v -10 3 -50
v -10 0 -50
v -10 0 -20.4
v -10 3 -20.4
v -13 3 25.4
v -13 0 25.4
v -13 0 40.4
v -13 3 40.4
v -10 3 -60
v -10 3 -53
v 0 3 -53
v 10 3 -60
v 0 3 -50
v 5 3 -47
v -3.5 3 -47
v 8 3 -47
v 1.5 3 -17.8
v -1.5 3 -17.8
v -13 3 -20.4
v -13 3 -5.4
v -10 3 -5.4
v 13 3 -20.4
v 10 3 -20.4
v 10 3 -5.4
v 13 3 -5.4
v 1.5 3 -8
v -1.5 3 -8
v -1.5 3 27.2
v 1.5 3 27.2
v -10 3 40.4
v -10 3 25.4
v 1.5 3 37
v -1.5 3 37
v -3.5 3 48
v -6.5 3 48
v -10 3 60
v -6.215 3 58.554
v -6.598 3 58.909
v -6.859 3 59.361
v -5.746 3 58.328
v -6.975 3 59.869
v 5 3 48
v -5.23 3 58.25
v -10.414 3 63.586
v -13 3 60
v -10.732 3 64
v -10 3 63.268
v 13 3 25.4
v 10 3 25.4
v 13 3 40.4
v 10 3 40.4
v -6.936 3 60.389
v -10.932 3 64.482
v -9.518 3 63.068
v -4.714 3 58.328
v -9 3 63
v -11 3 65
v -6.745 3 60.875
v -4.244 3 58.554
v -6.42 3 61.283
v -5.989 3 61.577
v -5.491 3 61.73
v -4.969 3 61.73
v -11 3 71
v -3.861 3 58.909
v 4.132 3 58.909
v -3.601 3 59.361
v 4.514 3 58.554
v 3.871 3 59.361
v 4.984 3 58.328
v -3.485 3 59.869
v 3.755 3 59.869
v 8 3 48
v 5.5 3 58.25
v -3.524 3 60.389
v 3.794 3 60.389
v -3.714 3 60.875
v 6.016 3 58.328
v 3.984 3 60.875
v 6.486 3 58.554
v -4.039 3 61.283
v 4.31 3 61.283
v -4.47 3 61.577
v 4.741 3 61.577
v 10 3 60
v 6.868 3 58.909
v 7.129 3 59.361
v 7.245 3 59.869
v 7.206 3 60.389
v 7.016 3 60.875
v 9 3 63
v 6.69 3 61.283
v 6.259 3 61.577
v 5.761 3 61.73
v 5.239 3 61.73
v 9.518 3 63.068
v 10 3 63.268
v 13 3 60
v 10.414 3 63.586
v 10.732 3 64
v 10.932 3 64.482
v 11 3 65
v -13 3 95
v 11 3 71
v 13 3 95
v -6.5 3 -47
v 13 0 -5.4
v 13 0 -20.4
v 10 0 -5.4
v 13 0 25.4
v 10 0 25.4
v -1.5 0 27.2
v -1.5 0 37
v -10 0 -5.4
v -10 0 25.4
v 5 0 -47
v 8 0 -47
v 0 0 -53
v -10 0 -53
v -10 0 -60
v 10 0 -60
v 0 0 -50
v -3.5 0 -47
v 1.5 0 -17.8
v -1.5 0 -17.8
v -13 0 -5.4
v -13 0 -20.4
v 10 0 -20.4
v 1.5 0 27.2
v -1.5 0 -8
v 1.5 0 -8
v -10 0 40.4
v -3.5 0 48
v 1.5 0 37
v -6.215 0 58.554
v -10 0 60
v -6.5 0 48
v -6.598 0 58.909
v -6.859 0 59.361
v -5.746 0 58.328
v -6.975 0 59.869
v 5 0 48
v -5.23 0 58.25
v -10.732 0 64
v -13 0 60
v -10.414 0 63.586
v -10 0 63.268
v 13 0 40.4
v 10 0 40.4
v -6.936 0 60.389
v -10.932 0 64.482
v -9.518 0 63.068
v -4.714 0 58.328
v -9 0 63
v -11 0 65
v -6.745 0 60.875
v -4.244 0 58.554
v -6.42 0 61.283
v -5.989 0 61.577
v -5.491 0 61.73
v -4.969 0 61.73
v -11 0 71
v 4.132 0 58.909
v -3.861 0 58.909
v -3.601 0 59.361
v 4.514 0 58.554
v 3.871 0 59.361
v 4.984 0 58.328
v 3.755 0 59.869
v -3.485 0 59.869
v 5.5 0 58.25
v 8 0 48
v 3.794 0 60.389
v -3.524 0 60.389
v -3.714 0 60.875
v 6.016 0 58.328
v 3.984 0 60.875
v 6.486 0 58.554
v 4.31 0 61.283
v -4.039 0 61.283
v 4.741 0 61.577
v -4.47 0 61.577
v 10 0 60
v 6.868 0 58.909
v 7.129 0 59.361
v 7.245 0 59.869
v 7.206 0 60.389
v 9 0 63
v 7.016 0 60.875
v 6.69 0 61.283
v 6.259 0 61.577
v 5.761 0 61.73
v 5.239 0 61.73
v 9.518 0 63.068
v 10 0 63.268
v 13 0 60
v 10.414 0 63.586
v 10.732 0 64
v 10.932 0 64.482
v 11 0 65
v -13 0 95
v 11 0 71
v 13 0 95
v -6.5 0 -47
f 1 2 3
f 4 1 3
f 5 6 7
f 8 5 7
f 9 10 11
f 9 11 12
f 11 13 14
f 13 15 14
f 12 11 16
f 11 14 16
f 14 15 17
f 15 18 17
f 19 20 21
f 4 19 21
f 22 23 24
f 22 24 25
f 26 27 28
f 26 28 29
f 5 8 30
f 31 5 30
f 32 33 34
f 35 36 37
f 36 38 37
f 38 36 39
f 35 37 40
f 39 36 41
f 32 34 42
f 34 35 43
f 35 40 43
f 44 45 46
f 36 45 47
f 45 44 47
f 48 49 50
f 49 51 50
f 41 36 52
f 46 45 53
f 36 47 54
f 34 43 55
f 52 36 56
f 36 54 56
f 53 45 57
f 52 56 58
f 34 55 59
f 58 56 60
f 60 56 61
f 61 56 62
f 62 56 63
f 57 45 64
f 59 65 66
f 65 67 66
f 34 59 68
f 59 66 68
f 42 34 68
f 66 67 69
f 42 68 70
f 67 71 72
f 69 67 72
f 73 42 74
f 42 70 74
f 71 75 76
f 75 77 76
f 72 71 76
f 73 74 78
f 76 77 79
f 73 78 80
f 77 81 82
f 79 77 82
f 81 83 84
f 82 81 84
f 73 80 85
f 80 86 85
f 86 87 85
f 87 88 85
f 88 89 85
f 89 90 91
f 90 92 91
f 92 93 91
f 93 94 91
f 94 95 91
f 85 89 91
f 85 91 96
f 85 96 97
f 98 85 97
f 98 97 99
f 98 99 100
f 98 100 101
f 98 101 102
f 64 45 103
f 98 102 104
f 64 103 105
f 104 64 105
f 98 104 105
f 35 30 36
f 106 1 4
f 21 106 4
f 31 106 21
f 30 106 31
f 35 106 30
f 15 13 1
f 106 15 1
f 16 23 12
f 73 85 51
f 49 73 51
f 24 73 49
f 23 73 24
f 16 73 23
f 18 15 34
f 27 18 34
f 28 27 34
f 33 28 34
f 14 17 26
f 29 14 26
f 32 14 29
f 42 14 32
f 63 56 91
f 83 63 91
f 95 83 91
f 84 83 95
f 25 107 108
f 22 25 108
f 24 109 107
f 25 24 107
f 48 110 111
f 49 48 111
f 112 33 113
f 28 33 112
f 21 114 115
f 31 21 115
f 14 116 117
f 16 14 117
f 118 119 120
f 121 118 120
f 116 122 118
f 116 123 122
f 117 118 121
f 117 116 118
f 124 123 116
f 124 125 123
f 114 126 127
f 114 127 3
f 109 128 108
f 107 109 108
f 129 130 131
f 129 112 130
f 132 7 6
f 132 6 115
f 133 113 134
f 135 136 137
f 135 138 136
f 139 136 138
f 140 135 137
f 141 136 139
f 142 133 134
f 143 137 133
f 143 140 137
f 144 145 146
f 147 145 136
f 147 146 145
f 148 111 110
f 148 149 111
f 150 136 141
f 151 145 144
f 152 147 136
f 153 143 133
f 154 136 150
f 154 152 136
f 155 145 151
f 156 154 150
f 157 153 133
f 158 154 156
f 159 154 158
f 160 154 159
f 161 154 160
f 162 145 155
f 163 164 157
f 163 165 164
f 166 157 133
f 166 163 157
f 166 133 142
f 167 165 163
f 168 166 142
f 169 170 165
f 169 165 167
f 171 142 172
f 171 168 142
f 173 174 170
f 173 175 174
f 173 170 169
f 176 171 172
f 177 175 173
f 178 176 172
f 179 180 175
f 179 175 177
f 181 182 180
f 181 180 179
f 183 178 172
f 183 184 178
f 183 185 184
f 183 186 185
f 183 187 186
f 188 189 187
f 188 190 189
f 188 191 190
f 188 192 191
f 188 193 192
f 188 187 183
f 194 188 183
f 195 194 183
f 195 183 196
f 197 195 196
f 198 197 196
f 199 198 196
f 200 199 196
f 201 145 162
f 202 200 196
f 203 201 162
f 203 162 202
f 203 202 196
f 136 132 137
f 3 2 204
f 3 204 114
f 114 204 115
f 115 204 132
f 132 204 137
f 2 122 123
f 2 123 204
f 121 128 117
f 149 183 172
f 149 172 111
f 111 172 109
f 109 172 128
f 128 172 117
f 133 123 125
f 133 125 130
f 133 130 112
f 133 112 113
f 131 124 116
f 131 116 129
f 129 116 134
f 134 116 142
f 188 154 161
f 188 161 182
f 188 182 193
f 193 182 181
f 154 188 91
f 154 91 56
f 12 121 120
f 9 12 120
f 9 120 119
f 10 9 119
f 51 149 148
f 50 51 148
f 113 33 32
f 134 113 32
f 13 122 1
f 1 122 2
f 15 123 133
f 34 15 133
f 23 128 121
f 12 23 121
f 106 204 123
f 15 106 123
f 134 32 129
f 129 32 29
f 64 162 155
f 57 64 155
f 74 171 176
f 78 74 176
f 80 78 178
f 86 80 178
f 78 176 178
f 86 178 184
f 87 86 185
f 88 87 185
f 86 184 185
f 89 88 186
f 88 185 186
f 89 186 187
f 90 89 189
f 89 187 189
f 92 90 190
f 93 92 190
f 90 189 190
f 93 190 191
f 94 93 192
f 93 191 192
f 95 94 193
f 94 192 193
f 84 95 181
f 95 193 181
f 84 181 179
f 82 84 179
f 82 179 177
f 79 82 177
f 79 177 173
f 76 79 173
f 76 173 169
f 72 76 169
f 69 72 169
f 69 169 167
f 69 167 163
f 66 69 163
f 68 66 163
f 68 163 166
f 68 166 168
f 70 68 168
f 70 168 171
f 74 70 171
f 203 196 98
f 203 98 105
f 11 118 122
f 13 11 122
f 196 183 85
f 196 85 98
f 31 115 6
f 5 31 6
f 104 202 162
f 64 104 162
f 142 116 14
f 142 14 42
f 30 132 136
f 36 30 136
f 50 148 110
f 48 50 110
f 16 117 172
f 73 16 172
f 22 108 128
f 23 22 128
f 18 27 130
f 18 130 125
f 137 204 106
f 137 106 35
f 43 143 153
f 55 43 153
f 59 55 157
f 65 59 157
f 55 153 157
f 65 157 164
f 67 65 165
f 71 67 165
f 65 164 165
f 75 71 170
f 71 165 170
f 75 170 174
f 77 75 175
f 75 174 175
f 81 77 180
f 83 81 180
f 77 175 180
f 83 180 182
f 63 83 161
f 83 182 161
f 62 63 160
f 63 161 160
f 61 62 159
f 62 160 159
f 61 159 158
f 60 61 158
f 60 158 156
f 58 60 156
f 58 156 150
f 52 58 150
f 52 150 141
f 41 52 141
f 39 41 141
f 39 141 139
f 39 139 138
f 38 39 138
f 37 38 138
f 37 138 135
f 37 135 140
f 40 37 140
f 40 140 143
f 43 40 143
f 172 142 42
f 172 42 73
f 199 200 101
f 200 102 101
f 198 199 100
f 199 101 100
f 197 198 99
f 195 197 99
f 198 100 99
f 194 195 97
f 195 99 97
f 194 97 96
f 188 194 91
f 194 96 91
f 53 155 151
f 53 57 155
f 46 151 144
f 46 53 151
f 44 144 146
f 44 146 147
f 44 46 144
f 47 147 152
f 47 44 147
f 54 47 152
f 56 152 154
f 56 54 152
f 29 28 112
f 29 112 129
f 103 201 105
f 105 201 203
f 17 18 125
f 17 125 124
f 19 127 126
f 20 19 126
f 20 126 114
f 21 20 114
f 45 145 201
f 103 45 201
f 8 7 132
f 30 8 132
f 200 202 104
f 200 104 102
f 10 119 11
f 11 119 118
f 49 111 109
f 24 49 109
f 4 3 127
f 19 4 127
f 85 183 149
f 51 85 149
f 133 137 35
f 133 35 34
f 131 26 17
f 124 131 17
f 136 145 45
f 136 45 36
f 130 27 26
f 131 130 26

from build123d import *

# Parameters (mm, degrees)
EXTRUDE_1_DEPTH     = 3
SKETCH_3_W          = 3
SKETCH_3_H          = 9.8
CUT_EXTRUDE_1_DEPTH = 10
SKETCH_4_W          = 26
SKETCH_4_H          = 35
EXTRUDE_2_DEPTH     = 3
SKETCH_5_W          = 22
SKETCH_5_H          = 8
CUT_EXTRUDE_2_DEPTH = 19
SKETCH_6_W          = 3
SKETCH_6_H          = 95
CUT_EXTRUDE_3_DEPTH = 25
FILLET_1_R          = 2
SKETCH_7_R          = 1.75
CUT_EXTRUDE_4_DEPTH = 10
SKETCH_8_R          = 1.75
SKETCH_8_W          = 3
SKETCH_8_H          = 95
CUT_EXTRUDE_5_DEPTH = 10


with BuildPart() as part:
    # Эскиз2 → Бобышка-Вытянуть1 (new body)
    with BuildSketch(Plane(origin=(0, 0, 0), x_dir=(1, 0, 0), z_dir=(0, 1, 0))):
        Polygon((-10, -60), (10, -60), (10, -40.4), (13, -40.4), (13, -25.4), (10, -25.4), (10, 5.4), (13, 5.4), (13, 20.4), (10, 20.4), (10, 60), (-10, 60), (-10, 53), (0, 53), (0, 50), (-10, 50), (-10, 20.4), (-13, 20.4), (-13, 5.4), (-10, 5.4), (-10, -25.4), (-13, -25.4), (-13, -40.4), (-10, -40.4), align=None)
    extrude(amount=EXTRUDE_1_DEPTH)

    # Эскиз3 → Вырез-Вытянуть1 (cut)
    with BuildSketch(Plane(origin=(0, 3, 0), x_dir=(1, 0, 0), z_dir=(0, 1, 0))):
        with Locations((0, 12.9)):
            Rectangle(SKETCH_3_W, SKETCH_3_H)
        with Locations((0, -32.1)):
            Rectangle(SKETCH_3_W, SKETCH_3_H)
    extrude(amount=-CUT_EXTRUDE_1_DEPTH, mode=Mode.SUBTRACT)

    # Эскиз4 → Бобышка-Вытянуть2 (add)
    with BuildSketch(Plane.XZ):
        with Locations((0, 77.5)):
            Rectangle(SKETCH_4_W, SKETCH_4_H)
    extrude(amount=-EXTRUDE_2_DEPTH)

    # Эскиз5 → Вырез-Вытянуть2 (cut)
    with BuildSketch(Plane(origin=(0, 0, 0), x_dir=(-1, 0, 0), z_dir=(0, -1, 0))):
        with Locations((0, -67)):
            Rectangle(SKETCH_5_W, SKETCH_5_H)
    extrude(amount=-CUT_EXTRUDE_2_DEPTH, mode=Mode.SUBTRACT)

    # Эскиз6 → Вырез-Вытянуть3 (cut)
    with BuildSketch(Plane.XZ):
        with Locations((6.5, 0.5)):
            Rectangle(SKETCH_6_W, SKETCH_6_H)
    extrude(amount=-CUT_EXTRUDE_3_DEPTH, mode=Mode.SUBTRACT)

    # Скругление1
    fillet_1_edges = [part.edges().sort_by_distance(p)[0] for p in [
        (-11, 1.5, 63),
        (11, 1.5, 63),
    ]]
    fillet(fillet_1_edges, radius=FILLET_1_R)

    # Эскиз7 → Вырез-Вытянуть4 (cut)
    with BuildSketch(Plane.XZ):
        with Locations(Location((5.5, 60, 0), (0, 0, 270))):
            Circle(SKETCH_7_R)
    extrude(amount=-CUT_EXTRUDE_4_DEPTH, mode=Mode.SUBTRACT)

    # Эскиз8 → Вырез-Вытянуть5 (cut)
    with BuildSketch(Plane.XZ):
        with Locations(Location((-5.229687219, 60, 0), (0, 0, 270))):
            Circle(SKETCH_8_R)
        with Locations((-5, 0.5)):
            Rectangle(SKETCH_8_W, SKETCH_8_H)
    extrude(amount=-CUT_EXTRUDE_5_DEPTH, mode=Mode.SUBTRACT)


solid = part.part
